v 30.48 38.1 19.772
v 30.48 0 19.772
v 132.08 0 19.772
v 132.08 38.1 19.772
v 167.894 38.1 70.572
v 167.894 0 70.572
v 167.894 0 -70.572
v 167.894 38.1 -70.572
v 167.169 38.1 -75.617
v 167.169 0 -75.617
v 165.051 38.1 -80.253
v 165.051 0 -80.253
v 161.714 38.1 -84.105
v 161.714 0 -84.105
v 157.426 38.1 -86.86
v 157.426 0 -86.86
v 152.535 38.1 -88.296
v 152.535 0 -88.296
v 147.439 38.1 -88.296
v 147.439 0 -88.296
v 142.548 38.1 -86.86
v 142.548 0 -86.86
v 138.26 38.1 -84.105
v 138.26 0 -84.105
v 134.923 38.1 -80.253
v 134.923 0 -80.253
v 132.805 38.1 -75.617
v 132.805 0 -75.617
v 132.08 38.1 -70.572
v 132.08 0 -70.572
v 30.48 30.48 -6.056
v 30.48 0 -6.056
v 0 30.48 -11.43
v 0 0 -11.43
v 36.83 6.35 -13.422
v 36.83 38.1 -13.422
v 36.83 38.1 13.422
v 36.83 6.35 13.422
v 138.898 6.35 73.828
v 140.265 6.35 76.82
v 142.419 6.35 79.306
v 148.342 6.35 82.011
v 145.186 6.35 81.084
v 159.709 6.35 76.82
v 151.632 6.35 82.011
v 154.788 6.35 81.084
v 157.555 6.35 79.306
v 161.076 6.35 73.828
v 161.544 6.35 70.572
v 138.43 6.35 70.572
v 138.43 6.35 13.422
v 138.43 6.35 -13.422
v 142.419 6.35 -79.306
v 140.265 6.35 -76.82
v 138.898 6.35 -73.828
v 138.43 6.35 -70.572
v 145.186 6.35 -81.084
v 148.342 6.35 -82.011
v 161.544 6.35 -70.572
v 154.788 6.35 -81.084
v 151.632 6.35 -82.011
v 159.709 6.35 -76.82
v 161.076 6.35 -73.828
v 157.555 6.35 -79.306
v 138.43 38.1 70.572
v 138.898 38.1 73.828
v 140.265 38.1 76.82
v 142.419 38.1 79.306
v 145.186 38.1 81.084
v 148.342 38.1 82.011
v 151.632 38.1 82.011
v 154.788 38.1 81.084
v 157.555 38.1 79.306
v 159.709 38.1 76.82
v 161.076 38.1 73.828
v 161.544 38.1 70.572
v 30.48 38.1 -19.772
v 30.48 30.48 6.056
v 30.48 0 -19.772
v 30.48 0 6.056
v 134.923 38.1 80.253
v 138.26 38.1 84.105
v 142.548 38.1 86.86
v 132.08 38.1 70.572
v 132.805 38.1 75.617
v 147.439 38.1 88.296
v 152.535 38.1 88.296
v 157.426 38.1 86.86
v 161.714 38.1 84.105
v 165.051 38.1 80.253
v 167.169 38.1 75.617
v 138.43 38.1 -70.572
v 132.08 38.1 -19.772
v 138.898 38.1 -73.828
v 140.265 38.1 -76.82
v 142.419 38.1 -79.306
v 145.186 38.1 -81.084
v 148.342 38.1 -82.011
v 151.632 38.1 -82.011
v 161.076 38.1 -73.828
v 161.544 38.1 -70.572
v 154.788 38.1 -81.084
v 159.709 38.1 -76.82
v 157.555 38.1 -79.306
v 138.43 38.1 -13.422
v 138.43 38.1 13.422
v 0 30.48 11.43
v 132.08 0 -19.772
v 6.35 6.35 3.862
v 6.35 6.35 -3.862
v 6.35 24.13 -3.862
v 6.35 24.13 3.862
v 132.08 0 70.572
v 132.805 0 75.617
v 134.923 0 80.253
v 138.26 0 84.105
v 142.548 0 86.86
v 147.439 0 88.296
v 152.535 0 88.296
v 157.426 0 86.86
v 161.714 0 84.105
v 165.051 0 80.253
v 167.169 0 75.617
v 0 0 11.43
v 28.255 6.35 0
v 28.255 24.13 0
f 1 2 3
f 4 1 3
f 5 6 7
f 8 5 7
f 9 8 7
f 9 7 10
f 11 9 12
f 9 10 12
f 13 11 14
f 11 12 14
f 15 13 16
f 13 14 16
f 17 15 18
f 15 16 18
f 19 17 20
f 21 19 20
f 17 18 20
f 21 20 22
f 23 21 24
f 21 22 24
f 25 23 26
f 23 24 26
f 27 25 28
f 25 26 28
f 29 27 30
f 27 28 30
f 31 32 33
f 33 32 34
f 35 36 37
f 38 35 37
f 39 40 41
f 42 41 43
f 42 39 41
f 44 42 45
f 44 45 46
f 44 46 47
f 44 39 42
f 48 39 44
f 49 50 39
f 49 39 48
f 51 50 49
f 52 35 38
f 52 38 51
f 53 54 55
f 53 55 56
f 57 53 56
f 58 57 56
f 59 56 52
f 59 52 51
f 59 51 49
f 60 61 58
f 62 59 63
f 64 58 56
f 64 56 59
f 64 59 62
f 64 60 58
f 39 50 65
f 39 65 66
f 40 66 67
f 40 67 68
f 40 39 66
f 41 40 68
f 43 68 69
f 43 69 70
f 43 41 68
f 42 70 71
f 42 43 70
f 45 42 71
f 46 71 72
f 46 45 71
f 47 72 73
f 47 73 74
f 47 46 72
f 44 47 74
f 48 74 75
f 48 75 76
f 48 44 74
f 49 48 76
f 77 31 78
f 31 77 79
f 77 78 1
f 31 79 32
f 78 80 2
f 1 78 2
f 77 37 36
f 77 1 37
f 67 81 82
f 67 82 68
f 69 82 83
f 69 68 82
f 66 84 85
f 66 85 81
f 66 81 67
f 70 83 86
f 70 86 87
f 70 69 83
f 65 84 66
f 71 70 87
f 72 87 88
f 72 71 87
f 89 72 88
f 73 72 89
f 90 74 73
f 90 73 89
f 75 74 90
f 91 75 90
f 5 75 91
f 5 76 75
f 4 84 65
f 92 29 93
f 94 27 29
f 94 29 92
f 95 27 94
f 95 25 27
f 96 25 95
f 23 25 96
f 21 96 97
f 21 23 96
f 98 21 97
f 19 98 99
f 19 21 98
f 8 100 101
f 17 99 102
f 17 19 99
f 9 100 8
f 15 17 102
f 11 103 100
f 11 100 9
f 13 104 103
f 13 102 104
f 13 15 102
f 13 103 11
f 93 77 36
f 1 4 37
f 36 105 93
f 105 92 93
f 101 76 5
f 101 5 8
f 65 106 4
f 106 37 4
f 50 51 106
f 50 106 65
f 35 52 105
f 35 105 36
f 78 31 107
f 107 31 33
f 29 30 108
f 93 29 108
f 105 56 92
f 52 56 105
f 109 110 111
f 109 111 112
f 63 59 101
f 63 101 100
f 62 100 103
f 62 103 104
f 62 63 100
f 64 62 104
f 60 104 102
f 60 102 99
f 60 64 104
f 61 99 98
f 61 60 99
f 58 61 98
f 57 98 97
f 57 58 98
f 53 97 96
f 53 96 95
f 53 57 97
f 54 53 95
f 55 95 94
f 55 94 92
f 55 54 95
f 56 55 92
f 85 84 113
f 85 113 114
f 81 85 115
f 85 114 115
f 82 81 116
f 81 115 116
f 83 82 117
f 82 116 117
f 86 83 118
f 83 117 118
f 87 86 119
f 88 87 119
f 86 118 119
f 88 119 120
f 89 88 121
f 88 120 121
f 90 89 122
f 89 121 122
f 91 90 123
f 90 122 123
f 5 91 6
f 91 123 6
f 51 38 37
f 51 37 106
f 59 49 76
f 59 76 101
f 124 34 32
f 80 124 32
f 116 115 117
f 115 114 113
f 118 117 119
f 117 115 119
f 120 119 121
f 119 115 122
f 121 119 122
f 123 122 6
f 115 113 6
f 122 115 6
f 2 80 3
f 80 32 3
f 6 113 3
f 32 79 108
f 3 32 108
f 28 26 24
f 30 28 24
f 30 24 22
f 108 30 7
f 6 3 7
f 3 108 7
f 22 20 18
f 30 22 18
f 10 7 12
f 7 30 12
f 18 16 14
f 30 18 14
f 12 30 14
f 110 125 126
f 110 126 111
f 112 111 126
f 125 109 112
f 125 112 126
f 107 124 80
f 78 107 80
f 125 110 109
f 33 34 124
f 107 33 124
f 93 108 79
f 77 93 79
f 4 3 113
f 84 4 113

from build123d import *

# Parameters (mm, degrees)
BOSS_EXTRUDE1_DEPTH = 38.1
CUT_EXTRUDE10_DEPTH = 7.62
SHELL2_START        = 6.35
SHELL2_DEPTH        = 31.75
SHELL2_2_DEPTH      = 17.78


# Read off the part's stored shape, not the designer's step: Shell2
with BuildPart() as part:
    # Sketch1 → Boss-Extrude1 (new body)
    with BuildSketch(Plane(origin=(0, 0, 0), x_dir=(1, 0, 0), z_dir=(0, 1, 0))):
        with BuildLine():
            Line((0, 11.43), (0, -11.43))
            Line((0, -11.43), (30.48, -6.055553628))
            Line((30.48, -6.055553628), (30.48, -19.771553628))
            Line((30.48, -19.771553628), (132.08, -19.771553628))
            Line((132.08, -19.771553628), (132.08, -70.571553628))
            ThreePointArc((132.08, -70.571553628), (149.987, -88.478553628), (167.894, -70.571553628))
            Line((167.894, -70.571553628), (167.894, 70.571553628))
            ThreePointArc((167.894, 70.571553628), (149.987, 88.478553628), (132.08, 70.571553628))
            Line((132.08, 70.571553628), (132.08, 19.771553628))
            Line((132.08, 19.771553628), (30.48, 19.771553628))
            Line((30.48, 19.771553628), (30.48, 6.055553628))
            Line((30.48, 6.055553628), (0, 11.43))
        make_face()
    extrude(amount=BOSS_EXTRUDE1_DEPTH)

    # Sketch5 → Cut-Extrude10 (cut)
    with BuildSketch(Plane(origin=(0, 38.1, 0), x_dir=(1, 0, 0), z_dir=(0, 1, 0))):
        Polygon((0, -11.43), (0, 11.43), (0.205611809, 11.576348711), (30.48, 6.055553628), (30.48, -6.055553628), align=None)
    extrude(amount=-CUT_EXTRUDE10_DEPTH, mode=Mode.SUBTRACT)

    # Shell2 outline → Shell2 (cut)
    with BuildSketch(Plane(origin=(0, 0, 0), x_dir=(1, 0, 0), z_dir=(0, 1, 0)).offset(SHELL2_START)):
        with BuildLine():
            Line((36.83, 13.421553628), (36.83, -13.421553628))
            Line((36.83, -13.421553628), (138.43, -13.421553628))
            Line((138.43, -13.421553628), (138.43, -70.571553628))
            ThreePointArc((138.43, -70.571553628), (149.987, -82.128553628), (161.544, -70.571553628))
            Line((161.544, -70.571553628), (161.544, 70.571553628))
            ThreePointArc((161.544, 70.571553628), (149.987, 82.128553628), (138.43, 70.571553628))
            Line((138.43, 70.571553628), (138.43, 13.421553628))
            Line((138.43, 13.421553628), (36.83, 13.421553628))
        make_face()
    extrude(amount=SHELL2_DEPTH, mode=Mode.SUBTRACT)

    # Shell2 2 outline → Shell2 2 (cut)
    with BuildSketch(Plane(origin=(0, 0, 0), x_dir=(1, 0, 0), z_dir=(0, 1, 0)).offset(SHELL2_START)):
        Polygon((28.25455863, 0), (6.35, 3.862364687), (6.35, -3.862364687), align=None)
    extrude(amount=SHELL2_2_DEPTH, mode=Mode.SUBTRACT)


solid = part.part
